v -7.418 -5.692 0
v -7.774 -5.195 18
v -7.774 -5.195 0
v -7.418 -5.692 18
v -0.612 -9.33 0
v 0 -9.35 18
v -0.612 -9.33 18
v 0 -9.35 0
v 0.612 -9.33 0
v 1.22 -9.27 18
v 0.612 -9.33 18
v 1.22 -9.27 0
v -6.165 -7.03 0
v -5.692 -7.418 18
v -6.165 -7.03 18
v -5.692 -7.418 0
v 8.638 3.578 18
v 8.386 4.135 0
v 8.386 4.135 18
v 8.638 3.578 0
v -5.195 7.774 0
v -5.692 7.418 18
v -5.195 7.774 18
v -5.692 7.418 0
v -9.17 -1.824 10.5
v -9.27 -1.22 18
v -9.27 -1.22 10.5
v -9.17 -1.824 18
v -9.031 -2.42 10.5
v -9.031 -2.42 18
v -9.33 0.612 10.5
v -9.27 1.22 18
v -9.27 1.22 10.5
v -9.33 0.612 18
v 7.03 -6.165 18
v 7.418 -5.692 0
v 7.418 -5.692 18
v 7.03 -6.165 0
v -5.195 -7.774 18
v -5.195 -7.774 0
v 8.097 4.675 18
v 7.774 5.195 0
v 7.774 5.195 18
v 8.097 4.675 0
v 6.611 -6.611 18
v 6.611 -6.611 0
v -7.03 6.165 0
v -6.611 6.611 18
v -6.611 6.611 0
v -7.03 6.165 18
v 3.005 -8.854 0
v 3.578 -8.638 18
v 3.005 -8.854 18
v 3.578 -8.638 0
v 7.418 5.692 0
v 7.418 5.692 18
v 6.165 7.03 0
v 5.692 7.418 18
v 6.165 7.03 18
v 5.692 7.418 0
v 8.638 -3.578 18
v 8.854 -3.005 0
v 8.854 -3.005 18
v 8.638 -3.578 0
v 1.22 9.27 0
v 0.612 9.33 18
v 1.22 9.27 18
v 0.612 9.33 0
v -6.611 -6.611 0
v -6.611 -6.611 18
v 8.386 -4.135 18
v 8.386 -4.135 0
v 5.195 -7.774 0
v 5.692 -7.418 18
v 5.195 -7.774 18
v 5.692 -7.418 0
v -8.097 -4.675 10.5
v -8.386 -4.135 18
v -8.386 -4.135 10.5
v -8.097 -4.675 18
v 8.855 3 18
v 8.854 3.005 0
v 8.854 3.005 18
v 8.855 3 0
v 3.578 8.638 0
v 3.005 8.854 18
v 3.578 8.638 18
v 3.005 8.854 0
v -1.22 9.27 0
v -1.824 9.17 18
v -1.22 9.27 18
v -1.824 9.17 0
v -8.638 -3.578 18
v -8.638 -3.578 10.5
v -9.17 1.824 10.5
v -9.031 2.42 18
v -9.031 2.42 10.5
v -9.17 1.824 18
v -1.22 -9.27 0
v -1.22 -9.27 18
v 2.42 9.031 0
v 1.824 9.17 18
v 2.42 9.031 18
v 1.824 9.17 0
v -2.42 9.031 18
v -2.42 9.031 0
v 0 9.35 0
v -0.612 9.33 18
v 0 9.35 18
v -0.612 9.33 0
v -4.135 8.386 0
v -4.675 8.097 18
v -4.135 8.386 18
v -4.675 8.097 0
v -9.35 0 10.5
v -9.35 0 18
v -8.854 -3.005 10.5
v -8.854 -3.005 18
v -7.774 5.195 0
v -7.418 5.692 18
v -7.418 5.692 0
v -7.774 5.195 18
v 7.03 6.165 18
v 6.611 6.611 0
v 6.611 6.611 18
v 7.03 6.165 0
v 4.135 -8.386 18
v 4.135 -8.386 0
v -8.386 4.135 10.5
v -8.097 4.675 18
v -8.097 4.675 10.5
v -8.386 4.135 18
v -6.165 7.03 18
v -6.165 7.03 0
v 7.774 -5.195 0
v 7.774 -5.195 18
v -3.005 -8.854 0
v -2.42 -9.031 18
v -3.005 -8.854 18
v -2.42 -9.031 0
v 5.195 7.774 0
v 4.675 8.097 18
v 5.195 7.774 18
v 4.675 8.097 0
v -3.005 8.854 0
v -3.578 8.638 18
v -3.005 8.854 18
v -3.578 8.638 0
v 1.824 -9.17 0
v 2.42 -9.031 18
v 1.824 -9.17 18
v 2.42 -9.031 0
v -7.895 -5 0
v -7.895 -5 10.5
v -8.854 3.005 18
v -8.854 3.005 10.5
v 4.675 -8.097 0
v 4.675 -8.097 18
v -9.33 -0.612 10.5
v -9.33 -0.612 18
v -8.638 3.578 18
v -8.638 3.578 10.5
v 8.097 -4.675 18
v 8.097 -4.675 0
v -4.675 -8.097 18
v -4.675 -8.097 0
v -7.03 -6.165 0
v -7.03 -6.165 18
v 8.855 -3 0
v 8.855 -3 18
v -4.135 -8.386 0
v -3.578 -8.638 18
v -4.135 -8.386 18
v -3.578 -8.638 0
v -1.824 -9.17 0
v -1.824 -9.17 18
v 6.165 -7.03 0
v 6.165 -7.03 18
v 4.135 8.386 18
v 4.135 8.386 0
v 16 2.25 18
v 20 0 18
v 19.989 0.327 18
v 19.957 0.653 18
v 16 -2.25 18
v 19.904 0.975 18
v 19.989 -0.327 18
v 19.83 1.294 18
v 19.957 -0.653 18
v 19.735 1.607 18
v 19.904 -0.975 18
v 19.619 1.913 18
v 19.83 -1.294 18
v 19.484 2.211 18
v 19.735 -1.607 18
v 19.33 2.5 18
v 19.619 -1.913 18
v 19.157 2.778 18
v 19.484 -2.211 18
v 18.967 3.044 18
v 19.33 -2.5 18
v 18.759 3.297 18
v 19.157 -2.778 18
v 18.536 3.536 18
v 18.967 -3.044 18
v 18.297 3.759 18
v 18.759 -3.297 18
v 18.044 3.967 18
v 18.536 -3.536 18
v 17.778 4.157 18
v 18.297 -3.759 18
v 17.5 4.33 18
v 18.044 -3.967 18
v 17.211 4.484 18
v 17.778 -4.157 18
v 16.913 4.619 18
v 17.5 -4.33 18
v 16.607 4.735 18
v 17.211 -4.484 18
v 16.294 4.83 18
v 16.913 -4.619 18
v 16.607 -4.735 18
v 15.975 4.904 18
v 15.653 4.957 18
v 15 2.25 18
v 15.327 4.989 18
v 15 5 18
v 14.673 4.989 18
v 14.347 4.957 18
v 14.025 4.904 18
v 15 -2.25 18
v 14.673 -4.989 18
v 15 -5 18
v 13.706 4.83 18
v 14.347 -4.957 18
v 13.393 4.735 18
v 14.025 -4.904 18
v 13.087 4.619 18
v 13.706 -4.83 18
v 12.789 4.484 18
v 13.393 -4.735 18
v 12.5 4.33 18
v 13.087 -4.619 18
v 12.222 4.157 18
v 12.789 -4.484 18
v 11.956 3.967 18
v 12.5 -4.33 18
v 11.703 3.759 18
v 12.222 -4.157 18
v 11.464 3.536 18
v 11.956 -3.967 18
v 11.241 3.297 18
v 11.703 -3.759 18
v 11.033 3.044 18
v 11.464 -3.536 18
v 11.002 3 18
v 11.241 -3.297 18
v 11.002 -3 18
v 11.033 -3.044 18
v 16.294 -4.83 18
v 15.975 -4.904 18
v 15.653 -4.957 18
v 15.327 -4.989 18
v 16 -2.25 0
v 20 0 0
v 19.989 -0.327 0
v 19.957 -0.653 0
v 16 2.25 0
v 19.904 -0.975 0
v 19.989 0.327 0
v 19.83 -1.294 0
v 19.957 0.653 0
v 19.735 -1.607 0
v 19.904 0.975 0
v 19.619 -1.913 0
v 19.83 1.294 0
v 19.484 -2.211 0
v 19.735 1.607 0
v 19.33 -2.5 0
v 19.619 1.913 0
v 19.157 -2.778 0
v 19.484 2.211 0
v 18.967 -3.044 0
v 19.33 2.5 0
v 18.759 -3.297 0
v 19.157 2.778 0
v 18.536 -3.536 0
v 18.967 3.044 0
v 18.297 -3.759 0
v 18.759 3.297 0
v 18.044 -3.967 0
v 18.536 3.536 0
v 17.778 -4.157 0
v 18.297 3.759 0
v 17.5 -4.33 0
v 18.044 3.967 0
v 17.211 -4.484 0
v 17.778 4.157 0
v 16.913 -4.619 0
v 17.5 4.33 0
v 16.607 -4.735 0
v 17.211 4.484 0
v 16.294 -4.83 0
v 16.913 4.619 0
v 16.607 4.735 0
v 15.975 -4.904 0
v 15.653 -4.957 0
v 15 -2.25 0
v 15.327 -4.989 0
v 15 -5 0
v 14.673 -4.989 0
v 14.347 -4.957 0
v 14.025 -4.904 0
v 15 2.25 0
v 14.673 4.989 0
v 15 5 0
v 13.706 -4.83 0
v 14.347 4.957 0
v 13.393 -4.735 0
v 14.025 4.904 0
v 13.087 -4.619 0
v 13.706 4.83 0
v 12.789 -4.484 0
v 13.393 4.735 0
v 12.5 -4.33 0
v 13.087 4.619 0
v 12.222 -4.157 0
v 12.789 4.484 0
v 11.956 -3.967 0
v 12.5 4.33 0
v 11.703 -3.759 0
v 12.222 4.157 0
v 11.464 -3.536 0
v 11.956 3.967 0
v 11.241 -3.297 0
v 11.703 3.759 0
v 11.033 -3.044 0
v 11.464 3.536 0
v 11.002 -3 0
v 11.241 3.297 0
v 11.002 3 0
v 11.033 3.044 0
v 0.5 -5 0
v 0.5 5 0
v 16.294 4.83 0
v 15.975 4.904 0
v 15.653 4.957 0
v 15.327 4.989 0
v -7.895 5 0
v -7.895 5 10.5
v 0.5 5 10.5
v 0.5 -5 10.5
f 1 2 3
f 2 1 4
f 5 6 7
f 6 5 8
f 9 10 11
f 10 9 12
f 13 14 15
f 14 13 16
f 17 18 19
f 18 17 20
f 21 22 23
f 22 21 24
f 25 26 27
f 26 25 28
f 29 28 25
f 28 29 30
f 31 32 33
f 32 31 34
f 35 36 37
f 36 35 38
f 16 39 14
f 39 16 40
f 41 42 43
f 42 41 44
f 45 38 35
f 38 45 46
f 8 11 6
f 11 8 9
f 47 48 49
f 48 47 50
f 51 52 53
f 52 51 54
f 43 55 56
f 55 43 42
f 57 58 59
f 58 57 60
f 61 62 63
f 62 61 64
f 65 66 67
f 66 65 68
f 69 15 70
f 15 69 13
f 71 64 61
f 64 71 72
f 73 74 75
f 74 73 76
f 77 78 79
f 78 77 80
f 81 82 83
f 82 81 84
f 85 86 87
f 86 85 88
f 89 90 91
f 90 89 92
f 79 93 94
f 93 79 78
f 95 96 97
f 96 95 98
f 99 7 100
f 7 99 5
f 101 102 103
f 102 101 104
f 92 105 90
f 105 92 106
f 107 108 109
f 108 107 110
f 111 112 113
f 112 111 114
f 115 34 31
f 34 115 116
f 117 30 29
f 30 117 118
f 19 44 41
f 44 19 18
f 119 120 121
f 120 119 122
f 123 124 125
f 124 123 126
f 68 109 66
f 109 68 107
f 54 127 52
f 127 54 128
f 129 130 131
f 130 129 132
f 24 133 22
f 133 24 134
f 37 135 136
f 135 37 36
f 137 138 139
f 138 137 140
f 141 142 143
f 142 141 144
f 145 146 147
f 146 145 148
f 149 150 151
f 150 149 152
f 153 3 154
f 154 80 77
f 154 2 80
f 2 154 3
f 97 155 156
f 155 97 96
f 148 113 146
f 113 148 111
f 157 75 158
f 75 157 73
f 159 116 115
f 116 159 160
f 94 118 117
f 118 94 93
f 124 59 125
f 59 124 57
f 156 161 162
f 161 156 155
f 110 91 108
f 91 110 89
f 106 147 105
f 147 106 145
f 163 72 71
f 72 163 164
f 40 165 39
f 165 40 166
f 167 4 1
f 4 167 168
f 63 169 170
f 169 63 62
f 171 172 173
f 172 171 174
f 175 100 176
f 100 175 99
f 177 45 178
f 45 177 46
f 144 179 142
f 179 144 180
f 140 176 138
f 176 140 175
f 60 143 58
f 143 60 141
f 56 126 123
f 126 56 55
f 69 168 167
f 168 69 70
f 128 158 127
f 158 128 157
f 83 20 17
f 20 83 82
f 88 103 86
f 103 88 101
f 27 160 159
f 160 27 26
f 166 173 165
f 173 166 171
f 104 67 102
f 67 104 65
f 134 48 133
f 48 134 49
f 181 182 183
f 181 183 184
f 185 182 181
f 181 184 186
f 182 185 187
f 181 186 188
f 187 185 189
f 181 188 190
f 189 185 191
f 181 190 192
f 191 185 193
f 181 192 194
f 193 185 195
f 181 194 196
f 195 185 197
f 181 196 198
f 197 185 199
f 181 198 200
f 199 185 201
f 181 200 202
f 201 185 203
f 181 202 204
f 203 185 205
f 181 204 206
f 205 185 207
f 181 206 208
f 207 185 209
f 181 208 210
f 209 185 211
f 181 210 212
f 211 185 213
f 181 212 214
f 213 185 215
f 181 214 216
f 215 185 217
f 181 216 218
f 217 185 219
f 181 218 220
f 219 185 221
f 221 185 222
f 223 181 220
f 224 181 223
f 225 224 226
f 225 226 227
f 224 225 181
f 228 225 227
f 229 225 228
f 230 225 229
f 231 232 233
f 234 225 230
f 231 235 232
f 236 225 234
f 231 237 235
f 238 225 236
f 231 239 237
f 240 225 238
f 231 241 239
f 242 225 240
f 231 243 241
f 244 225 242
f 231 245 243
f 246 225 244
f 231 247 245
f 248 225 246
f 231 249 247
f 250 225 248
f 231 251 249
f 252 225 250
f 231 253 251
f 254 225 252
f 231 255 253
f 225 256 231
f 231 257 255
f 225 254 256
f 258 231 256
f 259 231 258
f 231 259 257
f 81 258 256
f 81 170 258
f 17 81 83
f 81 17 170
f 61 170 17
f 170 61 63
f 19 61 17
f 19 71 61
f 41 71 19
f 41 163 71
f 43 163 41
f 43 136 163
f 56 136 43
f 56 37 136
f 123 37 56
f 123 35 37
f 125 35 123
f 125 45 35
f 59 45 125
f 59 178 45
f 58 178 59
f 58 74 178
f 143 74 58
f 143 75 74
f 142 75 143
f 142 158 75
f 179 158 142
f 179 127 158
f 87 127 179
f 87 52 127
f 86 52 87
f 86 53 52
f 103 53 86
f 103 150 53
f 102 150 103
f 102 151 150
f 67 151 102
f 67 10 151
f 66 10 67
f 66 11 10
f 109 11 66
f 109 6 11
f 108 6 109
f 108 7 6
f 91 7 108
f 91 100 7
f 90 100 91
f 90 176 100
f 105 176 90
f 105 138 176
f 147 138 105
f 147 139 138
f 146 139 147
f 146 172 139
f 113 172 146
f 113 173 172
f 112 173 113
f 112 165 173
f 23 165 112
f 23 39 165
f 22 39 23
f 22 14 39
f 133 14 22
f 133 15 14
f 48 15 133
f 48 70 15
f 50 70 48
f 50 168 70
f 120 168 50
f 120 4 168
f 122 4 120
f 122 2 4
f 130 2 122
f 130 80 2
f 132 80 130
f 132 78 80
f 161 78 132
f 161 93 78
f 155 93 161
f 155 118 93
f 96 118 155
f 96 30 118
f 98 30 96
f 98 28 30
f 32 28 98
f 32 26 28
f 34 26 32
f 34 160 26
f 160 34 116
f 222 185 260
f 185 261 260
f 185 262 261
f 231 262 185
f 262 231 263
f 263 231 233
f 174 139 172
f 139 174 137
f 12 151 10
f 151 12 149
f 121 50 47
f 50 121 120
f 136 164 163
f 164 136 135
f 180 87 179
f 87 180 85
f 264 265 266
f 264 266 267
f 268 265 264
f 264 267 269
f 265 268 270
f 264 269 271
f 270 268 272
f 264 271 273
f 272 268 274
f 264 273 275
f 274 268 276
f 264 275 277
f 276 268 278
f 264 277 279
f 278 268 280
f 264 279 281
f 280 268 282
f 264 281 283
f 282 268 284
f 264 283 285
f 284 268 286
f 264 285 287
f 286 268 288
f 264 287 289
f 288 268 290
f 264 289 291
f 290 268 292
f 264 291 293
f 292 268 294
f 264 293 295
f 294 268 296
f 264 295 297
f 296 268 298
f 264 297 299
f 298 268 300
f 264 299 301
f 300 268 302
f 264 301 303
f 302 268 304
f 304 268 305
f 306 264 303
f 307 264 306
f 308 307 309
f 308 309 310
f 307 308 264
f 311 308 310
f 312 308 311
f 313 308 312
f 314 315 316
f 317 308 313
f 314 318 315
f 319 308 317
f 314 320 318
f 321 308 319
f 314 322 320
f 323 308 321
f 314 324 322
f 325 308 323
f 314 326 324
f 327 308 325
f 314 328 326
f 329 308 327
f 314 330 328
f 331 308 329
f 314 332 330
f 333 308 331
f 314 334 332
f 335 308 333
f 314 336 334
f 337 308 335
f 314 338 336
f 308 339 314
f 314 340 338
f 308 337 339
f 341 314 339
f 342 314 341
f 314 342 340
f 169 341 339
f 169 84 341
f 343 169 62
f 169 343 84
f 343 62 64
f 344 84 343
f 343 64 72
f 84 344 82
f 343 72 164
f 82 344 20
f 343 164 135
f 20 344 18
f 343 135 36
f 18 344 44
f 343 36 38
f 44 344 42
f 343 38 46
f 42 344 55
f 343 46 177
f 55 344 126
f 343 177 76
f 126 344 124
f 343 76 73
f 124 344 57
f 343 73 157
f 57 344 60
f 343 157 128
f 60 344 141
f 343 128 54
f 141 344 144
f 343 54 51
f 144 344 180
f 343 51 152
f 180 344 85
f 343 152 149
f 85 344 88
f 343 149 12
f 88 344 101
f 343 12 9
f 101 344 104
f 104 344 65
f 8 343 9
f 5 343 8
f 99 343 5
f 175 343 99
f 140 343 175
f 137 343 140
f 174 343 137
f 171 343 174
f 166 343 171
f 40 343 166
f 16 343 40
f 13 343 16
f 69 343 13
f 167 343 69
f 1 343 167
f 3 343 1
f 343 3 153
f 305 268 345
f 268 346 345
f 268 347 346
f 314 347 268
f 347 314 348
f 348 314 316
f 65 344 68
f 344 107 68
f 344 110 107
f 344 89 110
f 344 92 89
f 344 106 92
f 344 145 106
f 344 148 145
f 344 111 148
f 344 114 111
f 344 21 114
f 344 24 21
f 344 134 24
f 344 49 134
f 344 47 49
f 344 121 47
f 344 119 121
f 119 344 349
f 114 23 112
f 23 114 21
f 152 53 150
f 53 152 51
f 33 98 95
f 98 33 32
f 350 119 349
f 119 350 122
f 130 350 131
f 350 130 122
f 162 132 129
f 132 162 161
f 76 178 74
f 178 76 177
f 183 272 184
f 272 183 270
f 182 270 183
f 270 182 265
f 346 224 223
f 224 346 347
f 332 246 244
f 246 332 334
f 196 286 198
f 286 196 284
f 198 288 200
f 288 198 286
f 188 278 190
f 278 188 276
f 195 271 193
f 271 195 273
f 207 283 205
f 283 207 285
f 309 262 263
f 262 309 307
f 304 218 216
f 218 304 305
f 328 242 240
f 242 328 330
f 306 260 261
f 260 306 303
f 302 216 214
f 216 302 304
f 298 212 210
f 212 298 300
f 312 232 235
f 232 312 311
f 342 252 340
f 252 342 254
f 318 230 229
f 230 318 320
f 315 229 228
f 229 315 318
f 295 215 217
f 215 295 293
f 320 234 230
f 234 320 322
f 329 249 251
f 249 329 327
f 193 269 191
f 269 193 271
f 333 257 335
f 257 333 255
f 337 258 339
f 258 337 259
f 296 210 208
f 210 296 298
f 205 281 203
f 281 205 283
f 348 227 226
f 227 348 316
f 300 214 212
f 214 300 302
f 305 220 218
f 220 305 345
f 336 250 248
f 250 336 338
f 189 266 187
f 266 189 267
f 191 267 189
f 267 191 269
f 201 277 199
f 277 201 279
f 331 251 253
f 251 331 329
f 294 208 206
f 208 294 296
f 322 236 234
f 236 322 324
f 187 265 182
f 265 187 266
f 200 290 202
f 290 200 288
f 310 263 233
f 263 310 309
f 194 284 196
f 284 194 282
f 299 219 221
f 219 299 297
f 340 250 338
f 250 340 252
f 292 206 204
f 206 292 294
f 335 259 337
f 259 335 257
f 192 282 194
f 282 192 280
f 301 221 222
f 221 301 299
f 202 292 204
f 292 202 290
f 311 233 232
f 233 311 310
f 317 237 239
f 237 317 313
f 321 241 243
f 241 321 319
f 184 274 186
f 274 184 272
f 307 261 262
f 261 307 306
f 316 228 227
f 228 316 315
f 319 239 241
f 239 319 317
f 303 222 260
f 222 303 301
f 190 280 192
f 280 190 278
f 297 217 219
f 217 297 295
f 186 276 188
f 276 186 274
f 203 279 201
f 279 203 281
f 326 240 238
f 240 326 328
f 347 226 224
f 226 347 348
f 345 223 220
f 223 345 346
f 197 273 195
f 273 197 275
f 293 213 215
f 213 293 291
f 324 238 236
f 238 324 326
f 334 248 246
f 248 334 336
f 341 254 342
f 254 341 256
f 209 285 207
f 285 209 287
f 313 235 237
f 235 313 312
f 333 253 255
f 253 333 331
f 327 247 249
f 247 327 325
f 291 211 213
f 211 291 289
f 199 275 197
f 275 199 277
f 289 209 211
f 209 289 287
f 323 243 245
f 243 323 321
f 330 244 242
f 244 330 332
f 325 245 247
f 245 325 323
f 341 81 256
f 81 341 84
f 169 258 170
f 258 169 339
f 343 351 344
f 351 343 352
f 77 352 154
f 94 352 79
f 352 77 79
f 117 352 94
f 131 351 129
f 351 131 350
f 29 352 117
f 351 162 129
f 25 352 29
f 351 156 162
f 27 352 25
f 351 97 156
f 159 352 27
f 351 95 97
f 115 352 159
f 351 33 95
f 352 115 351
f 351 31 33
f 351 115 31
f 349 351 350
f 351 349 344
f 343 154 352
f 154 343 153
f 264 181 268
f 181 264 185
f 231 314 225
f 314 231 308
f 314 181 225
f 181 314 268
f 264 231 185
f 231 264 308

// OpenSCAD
// Tubing clip for a 12.7 mm (1/2 inch) lab stand rod
// Print orientation: flat on the bed, extruded upward in +Z

// ---------------- Parameters ----------------
rod_d        = 12.7;   // stand rod diameter
ring_w       = 3;      // rod ring wall thickness
ring_od      = rod_d + 2 * ring_w;  // rod ring outer diameter (18.7 mm)
ring_id      = rod_d;  // rod ring inner diameter (12.7 mm)

tub_d        = 6;      // tubing ring inner diameter
tub_w        = 2;      // tubing ring wall thickness
tub_od       = tub_d + 2 * tub_w;   // tubing ring outer diameter (10 mm)
tub_x        = 15;     // tubing ring centre, X
tub_y        = 0;      // tubing ring centre, Y

bridge_x0    = 8;      // bridge start (X)
bridge_x1    = 12;     // bridge end (X)
bridge_w     = 6;      // bridge width (Y)

opening_rod  = 10;     // rod ring opening width (Y), x < 0
opening_tub  = 4.5;    // tubing ring opening width (Y), x > 15

eps          = 0.5;    // cutter overshoot past faces
$fn          = 96;     // circle resolution

// ---------------- Model ----------------
difference() {
    union() {
        // Rod ring
        cylinder(d = ring_od, h = opening_rod + tub_w + bridge_w);

        // Tubing ring
        translate([tub_x, tub_y, 0])
            cylinder(d = tub_od, h = opening_rod + tub_w + bridge_w);

        // Solid bridge
        translate([bridge_x0, -bridge_w / 2, 0])
            cube([bridge_x1 - bridge_x0, bridge_w, opening_rod + tub_w + bridge_w]);
    }

    // Rod ring opening: x < 0, -5 < y < 5
    translate([-ring_id - eps, -opening_rod / 2, -eps])
        cube([ring_id + 2 * eps, opening_rod, opening_rod + 2 * eps]);

    // Tubing ring opening: x > 15, -2.25 < y < 2.25
    translate([tub_x, -opening_tub / 2, -eps])
        cube([eps + 0.5, opening_tub, opening_rod + tub_w + bridge_w + 2 * eps]);
}
